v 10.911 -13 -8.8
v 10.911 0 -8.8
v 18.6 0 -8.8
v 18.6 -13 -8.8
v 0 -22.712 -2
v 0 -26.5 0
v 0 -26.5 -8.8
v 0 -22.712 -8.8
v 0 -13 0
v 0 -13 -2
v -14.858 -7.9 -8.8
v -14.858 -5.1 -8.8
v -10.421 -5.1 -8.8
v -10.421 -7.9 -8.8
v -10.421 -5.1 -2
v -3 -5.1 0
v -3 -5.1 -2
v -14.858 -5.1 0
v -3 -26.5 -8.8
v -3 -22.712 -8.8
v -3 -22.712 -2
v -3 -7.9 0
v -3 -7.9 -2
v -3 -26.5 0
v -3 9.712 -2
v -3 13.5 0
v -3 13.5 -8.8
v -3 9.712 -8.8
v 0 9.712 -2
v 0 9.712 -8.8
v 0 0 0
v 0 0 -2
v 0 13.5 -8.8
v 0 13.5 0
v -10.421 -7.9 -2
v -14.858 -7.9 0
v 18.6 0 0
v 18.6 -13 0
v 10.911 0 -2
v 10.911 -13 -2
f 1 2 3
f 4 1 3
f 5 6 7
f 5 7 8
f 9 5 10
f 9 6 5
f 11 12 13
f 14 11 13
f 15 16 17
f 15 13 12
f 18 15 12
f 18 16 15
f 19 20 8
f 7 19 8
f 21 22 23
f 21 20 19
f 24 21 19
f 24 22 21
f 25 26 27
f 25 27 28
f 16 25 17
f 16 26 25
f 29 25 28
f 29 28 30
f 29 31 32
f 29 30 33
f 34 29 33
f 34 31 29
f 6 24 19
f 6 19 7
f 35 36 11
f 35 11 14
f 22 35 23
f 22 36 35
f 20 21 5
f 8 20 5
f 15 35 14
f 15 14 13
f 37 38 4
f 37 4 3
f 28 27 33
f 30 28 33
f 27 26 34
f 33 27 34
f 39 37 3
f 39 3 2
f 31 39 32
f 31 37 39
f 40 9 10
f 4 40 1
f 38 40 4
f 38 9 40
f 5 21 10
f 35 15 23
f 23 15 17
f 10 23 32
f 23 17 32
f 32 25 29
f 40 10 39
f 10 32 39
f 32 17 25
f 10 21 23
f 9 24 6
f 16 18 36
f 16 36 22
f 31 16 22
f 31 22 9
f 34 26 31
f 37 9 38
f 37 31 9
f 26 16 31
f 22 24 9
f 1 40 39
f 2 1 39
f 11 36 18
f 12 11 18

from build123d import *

# Parameters (mm, degrees)
SKETCH_1_W        = 4.436635541
SKETCH_1_H        = 2.8
EXTRUDE_1_DEPTH   = 8.8
SKETCH_1_W_2      = 7.689400099
SKETCH_1_H_2      = 13
EXTRUDE_1_2_DEPTH = 8.8
SKETCH_1_W_3      = 3
SKETCH_1_H_3      = 3.788471525
EXTRUDE_1_3_DEPTH = 8.8
EXTRUDE_1_4_DEPTH = 8.8
EXTRUDE_2_DEPTH   = 2


with BuildPart() as part:
    # ｽｹｯﾁ1 → ﾎﾞｽ - 押し出し1 (new body)
    with BuildSketch(Plane.XY):
        with Locations((-12.63934737, -6.5)):
            Rectangle(SKETCH_1_W, SKETCH_1_H)
    extrude(amount=-EXTRUDE_1_DEPTH)


with BuildPart() as body_2:
    # ｽｹｯﾁ1 → Extrude 1 2 (new body)
    with BuildSketch(Plane.XY):
        with Locations((14.755299951, -6.5)):
            Rectangle(SKETCH_1_W_2, SKETCH_1_H_2)
    extrude(amount=-EXTRUDE_1_2_DEPTH)



with BuildPart() as body_3:
    # ｽｹｯﾁ1 → Extrude 1 3 (new body)
    with BuildSketch(Plane.XY):
        with Locations((-1.5, 11.605764238)):
            Rectangle(SKETCH_1_W_3, SKETCH_1_H_3)
    extrude(amount=-EXTRUDE_1_3_DEPTH)


with BuildPart() as body_4:
    # ｽｹｯﾁ1 → Extrude 1 4 (new body)
    with BuildSketch(Plane.XY):
        with Locations((-1.5, -24.605764238)):
            Rectangle(SKETCH_1_W_3, SKETCH_1_H_3)
    extrude(amount=-EXTRUDE_1_4_DEPTH)


with BuildPart() as body_2_1:
    add(body_2.part)

    add(body_3.part)  # ﾎﾞｽ - 押し出し2 merges body 3

    add(body_4.part)  # ﾎﾞｽ - 押し出し2 merges body 4
    # ｽｹｯﾁ2 → ﾎﾞｽ - 押し出し2 (add)
    with BuildSketch(Plane.XY):
        Polygon((0, -13), (18.6, -13), (18.6, 0), (0, 0), (0, 13.5), (-3, 13.5), (-3, -5.1), (-14.85766514, -5.1), (-14.85766514, -7.9), (-3, -7.9), (-3, -26.5), (0, -26.5), align=None)
    extrude(amount=-EXTRUDE_2_DEPTH)


with BuildPart() as part_1:
    add(part.part)

    # Combine 1: union body 2
    add(body_2_1.part)


solid = part_1.part
